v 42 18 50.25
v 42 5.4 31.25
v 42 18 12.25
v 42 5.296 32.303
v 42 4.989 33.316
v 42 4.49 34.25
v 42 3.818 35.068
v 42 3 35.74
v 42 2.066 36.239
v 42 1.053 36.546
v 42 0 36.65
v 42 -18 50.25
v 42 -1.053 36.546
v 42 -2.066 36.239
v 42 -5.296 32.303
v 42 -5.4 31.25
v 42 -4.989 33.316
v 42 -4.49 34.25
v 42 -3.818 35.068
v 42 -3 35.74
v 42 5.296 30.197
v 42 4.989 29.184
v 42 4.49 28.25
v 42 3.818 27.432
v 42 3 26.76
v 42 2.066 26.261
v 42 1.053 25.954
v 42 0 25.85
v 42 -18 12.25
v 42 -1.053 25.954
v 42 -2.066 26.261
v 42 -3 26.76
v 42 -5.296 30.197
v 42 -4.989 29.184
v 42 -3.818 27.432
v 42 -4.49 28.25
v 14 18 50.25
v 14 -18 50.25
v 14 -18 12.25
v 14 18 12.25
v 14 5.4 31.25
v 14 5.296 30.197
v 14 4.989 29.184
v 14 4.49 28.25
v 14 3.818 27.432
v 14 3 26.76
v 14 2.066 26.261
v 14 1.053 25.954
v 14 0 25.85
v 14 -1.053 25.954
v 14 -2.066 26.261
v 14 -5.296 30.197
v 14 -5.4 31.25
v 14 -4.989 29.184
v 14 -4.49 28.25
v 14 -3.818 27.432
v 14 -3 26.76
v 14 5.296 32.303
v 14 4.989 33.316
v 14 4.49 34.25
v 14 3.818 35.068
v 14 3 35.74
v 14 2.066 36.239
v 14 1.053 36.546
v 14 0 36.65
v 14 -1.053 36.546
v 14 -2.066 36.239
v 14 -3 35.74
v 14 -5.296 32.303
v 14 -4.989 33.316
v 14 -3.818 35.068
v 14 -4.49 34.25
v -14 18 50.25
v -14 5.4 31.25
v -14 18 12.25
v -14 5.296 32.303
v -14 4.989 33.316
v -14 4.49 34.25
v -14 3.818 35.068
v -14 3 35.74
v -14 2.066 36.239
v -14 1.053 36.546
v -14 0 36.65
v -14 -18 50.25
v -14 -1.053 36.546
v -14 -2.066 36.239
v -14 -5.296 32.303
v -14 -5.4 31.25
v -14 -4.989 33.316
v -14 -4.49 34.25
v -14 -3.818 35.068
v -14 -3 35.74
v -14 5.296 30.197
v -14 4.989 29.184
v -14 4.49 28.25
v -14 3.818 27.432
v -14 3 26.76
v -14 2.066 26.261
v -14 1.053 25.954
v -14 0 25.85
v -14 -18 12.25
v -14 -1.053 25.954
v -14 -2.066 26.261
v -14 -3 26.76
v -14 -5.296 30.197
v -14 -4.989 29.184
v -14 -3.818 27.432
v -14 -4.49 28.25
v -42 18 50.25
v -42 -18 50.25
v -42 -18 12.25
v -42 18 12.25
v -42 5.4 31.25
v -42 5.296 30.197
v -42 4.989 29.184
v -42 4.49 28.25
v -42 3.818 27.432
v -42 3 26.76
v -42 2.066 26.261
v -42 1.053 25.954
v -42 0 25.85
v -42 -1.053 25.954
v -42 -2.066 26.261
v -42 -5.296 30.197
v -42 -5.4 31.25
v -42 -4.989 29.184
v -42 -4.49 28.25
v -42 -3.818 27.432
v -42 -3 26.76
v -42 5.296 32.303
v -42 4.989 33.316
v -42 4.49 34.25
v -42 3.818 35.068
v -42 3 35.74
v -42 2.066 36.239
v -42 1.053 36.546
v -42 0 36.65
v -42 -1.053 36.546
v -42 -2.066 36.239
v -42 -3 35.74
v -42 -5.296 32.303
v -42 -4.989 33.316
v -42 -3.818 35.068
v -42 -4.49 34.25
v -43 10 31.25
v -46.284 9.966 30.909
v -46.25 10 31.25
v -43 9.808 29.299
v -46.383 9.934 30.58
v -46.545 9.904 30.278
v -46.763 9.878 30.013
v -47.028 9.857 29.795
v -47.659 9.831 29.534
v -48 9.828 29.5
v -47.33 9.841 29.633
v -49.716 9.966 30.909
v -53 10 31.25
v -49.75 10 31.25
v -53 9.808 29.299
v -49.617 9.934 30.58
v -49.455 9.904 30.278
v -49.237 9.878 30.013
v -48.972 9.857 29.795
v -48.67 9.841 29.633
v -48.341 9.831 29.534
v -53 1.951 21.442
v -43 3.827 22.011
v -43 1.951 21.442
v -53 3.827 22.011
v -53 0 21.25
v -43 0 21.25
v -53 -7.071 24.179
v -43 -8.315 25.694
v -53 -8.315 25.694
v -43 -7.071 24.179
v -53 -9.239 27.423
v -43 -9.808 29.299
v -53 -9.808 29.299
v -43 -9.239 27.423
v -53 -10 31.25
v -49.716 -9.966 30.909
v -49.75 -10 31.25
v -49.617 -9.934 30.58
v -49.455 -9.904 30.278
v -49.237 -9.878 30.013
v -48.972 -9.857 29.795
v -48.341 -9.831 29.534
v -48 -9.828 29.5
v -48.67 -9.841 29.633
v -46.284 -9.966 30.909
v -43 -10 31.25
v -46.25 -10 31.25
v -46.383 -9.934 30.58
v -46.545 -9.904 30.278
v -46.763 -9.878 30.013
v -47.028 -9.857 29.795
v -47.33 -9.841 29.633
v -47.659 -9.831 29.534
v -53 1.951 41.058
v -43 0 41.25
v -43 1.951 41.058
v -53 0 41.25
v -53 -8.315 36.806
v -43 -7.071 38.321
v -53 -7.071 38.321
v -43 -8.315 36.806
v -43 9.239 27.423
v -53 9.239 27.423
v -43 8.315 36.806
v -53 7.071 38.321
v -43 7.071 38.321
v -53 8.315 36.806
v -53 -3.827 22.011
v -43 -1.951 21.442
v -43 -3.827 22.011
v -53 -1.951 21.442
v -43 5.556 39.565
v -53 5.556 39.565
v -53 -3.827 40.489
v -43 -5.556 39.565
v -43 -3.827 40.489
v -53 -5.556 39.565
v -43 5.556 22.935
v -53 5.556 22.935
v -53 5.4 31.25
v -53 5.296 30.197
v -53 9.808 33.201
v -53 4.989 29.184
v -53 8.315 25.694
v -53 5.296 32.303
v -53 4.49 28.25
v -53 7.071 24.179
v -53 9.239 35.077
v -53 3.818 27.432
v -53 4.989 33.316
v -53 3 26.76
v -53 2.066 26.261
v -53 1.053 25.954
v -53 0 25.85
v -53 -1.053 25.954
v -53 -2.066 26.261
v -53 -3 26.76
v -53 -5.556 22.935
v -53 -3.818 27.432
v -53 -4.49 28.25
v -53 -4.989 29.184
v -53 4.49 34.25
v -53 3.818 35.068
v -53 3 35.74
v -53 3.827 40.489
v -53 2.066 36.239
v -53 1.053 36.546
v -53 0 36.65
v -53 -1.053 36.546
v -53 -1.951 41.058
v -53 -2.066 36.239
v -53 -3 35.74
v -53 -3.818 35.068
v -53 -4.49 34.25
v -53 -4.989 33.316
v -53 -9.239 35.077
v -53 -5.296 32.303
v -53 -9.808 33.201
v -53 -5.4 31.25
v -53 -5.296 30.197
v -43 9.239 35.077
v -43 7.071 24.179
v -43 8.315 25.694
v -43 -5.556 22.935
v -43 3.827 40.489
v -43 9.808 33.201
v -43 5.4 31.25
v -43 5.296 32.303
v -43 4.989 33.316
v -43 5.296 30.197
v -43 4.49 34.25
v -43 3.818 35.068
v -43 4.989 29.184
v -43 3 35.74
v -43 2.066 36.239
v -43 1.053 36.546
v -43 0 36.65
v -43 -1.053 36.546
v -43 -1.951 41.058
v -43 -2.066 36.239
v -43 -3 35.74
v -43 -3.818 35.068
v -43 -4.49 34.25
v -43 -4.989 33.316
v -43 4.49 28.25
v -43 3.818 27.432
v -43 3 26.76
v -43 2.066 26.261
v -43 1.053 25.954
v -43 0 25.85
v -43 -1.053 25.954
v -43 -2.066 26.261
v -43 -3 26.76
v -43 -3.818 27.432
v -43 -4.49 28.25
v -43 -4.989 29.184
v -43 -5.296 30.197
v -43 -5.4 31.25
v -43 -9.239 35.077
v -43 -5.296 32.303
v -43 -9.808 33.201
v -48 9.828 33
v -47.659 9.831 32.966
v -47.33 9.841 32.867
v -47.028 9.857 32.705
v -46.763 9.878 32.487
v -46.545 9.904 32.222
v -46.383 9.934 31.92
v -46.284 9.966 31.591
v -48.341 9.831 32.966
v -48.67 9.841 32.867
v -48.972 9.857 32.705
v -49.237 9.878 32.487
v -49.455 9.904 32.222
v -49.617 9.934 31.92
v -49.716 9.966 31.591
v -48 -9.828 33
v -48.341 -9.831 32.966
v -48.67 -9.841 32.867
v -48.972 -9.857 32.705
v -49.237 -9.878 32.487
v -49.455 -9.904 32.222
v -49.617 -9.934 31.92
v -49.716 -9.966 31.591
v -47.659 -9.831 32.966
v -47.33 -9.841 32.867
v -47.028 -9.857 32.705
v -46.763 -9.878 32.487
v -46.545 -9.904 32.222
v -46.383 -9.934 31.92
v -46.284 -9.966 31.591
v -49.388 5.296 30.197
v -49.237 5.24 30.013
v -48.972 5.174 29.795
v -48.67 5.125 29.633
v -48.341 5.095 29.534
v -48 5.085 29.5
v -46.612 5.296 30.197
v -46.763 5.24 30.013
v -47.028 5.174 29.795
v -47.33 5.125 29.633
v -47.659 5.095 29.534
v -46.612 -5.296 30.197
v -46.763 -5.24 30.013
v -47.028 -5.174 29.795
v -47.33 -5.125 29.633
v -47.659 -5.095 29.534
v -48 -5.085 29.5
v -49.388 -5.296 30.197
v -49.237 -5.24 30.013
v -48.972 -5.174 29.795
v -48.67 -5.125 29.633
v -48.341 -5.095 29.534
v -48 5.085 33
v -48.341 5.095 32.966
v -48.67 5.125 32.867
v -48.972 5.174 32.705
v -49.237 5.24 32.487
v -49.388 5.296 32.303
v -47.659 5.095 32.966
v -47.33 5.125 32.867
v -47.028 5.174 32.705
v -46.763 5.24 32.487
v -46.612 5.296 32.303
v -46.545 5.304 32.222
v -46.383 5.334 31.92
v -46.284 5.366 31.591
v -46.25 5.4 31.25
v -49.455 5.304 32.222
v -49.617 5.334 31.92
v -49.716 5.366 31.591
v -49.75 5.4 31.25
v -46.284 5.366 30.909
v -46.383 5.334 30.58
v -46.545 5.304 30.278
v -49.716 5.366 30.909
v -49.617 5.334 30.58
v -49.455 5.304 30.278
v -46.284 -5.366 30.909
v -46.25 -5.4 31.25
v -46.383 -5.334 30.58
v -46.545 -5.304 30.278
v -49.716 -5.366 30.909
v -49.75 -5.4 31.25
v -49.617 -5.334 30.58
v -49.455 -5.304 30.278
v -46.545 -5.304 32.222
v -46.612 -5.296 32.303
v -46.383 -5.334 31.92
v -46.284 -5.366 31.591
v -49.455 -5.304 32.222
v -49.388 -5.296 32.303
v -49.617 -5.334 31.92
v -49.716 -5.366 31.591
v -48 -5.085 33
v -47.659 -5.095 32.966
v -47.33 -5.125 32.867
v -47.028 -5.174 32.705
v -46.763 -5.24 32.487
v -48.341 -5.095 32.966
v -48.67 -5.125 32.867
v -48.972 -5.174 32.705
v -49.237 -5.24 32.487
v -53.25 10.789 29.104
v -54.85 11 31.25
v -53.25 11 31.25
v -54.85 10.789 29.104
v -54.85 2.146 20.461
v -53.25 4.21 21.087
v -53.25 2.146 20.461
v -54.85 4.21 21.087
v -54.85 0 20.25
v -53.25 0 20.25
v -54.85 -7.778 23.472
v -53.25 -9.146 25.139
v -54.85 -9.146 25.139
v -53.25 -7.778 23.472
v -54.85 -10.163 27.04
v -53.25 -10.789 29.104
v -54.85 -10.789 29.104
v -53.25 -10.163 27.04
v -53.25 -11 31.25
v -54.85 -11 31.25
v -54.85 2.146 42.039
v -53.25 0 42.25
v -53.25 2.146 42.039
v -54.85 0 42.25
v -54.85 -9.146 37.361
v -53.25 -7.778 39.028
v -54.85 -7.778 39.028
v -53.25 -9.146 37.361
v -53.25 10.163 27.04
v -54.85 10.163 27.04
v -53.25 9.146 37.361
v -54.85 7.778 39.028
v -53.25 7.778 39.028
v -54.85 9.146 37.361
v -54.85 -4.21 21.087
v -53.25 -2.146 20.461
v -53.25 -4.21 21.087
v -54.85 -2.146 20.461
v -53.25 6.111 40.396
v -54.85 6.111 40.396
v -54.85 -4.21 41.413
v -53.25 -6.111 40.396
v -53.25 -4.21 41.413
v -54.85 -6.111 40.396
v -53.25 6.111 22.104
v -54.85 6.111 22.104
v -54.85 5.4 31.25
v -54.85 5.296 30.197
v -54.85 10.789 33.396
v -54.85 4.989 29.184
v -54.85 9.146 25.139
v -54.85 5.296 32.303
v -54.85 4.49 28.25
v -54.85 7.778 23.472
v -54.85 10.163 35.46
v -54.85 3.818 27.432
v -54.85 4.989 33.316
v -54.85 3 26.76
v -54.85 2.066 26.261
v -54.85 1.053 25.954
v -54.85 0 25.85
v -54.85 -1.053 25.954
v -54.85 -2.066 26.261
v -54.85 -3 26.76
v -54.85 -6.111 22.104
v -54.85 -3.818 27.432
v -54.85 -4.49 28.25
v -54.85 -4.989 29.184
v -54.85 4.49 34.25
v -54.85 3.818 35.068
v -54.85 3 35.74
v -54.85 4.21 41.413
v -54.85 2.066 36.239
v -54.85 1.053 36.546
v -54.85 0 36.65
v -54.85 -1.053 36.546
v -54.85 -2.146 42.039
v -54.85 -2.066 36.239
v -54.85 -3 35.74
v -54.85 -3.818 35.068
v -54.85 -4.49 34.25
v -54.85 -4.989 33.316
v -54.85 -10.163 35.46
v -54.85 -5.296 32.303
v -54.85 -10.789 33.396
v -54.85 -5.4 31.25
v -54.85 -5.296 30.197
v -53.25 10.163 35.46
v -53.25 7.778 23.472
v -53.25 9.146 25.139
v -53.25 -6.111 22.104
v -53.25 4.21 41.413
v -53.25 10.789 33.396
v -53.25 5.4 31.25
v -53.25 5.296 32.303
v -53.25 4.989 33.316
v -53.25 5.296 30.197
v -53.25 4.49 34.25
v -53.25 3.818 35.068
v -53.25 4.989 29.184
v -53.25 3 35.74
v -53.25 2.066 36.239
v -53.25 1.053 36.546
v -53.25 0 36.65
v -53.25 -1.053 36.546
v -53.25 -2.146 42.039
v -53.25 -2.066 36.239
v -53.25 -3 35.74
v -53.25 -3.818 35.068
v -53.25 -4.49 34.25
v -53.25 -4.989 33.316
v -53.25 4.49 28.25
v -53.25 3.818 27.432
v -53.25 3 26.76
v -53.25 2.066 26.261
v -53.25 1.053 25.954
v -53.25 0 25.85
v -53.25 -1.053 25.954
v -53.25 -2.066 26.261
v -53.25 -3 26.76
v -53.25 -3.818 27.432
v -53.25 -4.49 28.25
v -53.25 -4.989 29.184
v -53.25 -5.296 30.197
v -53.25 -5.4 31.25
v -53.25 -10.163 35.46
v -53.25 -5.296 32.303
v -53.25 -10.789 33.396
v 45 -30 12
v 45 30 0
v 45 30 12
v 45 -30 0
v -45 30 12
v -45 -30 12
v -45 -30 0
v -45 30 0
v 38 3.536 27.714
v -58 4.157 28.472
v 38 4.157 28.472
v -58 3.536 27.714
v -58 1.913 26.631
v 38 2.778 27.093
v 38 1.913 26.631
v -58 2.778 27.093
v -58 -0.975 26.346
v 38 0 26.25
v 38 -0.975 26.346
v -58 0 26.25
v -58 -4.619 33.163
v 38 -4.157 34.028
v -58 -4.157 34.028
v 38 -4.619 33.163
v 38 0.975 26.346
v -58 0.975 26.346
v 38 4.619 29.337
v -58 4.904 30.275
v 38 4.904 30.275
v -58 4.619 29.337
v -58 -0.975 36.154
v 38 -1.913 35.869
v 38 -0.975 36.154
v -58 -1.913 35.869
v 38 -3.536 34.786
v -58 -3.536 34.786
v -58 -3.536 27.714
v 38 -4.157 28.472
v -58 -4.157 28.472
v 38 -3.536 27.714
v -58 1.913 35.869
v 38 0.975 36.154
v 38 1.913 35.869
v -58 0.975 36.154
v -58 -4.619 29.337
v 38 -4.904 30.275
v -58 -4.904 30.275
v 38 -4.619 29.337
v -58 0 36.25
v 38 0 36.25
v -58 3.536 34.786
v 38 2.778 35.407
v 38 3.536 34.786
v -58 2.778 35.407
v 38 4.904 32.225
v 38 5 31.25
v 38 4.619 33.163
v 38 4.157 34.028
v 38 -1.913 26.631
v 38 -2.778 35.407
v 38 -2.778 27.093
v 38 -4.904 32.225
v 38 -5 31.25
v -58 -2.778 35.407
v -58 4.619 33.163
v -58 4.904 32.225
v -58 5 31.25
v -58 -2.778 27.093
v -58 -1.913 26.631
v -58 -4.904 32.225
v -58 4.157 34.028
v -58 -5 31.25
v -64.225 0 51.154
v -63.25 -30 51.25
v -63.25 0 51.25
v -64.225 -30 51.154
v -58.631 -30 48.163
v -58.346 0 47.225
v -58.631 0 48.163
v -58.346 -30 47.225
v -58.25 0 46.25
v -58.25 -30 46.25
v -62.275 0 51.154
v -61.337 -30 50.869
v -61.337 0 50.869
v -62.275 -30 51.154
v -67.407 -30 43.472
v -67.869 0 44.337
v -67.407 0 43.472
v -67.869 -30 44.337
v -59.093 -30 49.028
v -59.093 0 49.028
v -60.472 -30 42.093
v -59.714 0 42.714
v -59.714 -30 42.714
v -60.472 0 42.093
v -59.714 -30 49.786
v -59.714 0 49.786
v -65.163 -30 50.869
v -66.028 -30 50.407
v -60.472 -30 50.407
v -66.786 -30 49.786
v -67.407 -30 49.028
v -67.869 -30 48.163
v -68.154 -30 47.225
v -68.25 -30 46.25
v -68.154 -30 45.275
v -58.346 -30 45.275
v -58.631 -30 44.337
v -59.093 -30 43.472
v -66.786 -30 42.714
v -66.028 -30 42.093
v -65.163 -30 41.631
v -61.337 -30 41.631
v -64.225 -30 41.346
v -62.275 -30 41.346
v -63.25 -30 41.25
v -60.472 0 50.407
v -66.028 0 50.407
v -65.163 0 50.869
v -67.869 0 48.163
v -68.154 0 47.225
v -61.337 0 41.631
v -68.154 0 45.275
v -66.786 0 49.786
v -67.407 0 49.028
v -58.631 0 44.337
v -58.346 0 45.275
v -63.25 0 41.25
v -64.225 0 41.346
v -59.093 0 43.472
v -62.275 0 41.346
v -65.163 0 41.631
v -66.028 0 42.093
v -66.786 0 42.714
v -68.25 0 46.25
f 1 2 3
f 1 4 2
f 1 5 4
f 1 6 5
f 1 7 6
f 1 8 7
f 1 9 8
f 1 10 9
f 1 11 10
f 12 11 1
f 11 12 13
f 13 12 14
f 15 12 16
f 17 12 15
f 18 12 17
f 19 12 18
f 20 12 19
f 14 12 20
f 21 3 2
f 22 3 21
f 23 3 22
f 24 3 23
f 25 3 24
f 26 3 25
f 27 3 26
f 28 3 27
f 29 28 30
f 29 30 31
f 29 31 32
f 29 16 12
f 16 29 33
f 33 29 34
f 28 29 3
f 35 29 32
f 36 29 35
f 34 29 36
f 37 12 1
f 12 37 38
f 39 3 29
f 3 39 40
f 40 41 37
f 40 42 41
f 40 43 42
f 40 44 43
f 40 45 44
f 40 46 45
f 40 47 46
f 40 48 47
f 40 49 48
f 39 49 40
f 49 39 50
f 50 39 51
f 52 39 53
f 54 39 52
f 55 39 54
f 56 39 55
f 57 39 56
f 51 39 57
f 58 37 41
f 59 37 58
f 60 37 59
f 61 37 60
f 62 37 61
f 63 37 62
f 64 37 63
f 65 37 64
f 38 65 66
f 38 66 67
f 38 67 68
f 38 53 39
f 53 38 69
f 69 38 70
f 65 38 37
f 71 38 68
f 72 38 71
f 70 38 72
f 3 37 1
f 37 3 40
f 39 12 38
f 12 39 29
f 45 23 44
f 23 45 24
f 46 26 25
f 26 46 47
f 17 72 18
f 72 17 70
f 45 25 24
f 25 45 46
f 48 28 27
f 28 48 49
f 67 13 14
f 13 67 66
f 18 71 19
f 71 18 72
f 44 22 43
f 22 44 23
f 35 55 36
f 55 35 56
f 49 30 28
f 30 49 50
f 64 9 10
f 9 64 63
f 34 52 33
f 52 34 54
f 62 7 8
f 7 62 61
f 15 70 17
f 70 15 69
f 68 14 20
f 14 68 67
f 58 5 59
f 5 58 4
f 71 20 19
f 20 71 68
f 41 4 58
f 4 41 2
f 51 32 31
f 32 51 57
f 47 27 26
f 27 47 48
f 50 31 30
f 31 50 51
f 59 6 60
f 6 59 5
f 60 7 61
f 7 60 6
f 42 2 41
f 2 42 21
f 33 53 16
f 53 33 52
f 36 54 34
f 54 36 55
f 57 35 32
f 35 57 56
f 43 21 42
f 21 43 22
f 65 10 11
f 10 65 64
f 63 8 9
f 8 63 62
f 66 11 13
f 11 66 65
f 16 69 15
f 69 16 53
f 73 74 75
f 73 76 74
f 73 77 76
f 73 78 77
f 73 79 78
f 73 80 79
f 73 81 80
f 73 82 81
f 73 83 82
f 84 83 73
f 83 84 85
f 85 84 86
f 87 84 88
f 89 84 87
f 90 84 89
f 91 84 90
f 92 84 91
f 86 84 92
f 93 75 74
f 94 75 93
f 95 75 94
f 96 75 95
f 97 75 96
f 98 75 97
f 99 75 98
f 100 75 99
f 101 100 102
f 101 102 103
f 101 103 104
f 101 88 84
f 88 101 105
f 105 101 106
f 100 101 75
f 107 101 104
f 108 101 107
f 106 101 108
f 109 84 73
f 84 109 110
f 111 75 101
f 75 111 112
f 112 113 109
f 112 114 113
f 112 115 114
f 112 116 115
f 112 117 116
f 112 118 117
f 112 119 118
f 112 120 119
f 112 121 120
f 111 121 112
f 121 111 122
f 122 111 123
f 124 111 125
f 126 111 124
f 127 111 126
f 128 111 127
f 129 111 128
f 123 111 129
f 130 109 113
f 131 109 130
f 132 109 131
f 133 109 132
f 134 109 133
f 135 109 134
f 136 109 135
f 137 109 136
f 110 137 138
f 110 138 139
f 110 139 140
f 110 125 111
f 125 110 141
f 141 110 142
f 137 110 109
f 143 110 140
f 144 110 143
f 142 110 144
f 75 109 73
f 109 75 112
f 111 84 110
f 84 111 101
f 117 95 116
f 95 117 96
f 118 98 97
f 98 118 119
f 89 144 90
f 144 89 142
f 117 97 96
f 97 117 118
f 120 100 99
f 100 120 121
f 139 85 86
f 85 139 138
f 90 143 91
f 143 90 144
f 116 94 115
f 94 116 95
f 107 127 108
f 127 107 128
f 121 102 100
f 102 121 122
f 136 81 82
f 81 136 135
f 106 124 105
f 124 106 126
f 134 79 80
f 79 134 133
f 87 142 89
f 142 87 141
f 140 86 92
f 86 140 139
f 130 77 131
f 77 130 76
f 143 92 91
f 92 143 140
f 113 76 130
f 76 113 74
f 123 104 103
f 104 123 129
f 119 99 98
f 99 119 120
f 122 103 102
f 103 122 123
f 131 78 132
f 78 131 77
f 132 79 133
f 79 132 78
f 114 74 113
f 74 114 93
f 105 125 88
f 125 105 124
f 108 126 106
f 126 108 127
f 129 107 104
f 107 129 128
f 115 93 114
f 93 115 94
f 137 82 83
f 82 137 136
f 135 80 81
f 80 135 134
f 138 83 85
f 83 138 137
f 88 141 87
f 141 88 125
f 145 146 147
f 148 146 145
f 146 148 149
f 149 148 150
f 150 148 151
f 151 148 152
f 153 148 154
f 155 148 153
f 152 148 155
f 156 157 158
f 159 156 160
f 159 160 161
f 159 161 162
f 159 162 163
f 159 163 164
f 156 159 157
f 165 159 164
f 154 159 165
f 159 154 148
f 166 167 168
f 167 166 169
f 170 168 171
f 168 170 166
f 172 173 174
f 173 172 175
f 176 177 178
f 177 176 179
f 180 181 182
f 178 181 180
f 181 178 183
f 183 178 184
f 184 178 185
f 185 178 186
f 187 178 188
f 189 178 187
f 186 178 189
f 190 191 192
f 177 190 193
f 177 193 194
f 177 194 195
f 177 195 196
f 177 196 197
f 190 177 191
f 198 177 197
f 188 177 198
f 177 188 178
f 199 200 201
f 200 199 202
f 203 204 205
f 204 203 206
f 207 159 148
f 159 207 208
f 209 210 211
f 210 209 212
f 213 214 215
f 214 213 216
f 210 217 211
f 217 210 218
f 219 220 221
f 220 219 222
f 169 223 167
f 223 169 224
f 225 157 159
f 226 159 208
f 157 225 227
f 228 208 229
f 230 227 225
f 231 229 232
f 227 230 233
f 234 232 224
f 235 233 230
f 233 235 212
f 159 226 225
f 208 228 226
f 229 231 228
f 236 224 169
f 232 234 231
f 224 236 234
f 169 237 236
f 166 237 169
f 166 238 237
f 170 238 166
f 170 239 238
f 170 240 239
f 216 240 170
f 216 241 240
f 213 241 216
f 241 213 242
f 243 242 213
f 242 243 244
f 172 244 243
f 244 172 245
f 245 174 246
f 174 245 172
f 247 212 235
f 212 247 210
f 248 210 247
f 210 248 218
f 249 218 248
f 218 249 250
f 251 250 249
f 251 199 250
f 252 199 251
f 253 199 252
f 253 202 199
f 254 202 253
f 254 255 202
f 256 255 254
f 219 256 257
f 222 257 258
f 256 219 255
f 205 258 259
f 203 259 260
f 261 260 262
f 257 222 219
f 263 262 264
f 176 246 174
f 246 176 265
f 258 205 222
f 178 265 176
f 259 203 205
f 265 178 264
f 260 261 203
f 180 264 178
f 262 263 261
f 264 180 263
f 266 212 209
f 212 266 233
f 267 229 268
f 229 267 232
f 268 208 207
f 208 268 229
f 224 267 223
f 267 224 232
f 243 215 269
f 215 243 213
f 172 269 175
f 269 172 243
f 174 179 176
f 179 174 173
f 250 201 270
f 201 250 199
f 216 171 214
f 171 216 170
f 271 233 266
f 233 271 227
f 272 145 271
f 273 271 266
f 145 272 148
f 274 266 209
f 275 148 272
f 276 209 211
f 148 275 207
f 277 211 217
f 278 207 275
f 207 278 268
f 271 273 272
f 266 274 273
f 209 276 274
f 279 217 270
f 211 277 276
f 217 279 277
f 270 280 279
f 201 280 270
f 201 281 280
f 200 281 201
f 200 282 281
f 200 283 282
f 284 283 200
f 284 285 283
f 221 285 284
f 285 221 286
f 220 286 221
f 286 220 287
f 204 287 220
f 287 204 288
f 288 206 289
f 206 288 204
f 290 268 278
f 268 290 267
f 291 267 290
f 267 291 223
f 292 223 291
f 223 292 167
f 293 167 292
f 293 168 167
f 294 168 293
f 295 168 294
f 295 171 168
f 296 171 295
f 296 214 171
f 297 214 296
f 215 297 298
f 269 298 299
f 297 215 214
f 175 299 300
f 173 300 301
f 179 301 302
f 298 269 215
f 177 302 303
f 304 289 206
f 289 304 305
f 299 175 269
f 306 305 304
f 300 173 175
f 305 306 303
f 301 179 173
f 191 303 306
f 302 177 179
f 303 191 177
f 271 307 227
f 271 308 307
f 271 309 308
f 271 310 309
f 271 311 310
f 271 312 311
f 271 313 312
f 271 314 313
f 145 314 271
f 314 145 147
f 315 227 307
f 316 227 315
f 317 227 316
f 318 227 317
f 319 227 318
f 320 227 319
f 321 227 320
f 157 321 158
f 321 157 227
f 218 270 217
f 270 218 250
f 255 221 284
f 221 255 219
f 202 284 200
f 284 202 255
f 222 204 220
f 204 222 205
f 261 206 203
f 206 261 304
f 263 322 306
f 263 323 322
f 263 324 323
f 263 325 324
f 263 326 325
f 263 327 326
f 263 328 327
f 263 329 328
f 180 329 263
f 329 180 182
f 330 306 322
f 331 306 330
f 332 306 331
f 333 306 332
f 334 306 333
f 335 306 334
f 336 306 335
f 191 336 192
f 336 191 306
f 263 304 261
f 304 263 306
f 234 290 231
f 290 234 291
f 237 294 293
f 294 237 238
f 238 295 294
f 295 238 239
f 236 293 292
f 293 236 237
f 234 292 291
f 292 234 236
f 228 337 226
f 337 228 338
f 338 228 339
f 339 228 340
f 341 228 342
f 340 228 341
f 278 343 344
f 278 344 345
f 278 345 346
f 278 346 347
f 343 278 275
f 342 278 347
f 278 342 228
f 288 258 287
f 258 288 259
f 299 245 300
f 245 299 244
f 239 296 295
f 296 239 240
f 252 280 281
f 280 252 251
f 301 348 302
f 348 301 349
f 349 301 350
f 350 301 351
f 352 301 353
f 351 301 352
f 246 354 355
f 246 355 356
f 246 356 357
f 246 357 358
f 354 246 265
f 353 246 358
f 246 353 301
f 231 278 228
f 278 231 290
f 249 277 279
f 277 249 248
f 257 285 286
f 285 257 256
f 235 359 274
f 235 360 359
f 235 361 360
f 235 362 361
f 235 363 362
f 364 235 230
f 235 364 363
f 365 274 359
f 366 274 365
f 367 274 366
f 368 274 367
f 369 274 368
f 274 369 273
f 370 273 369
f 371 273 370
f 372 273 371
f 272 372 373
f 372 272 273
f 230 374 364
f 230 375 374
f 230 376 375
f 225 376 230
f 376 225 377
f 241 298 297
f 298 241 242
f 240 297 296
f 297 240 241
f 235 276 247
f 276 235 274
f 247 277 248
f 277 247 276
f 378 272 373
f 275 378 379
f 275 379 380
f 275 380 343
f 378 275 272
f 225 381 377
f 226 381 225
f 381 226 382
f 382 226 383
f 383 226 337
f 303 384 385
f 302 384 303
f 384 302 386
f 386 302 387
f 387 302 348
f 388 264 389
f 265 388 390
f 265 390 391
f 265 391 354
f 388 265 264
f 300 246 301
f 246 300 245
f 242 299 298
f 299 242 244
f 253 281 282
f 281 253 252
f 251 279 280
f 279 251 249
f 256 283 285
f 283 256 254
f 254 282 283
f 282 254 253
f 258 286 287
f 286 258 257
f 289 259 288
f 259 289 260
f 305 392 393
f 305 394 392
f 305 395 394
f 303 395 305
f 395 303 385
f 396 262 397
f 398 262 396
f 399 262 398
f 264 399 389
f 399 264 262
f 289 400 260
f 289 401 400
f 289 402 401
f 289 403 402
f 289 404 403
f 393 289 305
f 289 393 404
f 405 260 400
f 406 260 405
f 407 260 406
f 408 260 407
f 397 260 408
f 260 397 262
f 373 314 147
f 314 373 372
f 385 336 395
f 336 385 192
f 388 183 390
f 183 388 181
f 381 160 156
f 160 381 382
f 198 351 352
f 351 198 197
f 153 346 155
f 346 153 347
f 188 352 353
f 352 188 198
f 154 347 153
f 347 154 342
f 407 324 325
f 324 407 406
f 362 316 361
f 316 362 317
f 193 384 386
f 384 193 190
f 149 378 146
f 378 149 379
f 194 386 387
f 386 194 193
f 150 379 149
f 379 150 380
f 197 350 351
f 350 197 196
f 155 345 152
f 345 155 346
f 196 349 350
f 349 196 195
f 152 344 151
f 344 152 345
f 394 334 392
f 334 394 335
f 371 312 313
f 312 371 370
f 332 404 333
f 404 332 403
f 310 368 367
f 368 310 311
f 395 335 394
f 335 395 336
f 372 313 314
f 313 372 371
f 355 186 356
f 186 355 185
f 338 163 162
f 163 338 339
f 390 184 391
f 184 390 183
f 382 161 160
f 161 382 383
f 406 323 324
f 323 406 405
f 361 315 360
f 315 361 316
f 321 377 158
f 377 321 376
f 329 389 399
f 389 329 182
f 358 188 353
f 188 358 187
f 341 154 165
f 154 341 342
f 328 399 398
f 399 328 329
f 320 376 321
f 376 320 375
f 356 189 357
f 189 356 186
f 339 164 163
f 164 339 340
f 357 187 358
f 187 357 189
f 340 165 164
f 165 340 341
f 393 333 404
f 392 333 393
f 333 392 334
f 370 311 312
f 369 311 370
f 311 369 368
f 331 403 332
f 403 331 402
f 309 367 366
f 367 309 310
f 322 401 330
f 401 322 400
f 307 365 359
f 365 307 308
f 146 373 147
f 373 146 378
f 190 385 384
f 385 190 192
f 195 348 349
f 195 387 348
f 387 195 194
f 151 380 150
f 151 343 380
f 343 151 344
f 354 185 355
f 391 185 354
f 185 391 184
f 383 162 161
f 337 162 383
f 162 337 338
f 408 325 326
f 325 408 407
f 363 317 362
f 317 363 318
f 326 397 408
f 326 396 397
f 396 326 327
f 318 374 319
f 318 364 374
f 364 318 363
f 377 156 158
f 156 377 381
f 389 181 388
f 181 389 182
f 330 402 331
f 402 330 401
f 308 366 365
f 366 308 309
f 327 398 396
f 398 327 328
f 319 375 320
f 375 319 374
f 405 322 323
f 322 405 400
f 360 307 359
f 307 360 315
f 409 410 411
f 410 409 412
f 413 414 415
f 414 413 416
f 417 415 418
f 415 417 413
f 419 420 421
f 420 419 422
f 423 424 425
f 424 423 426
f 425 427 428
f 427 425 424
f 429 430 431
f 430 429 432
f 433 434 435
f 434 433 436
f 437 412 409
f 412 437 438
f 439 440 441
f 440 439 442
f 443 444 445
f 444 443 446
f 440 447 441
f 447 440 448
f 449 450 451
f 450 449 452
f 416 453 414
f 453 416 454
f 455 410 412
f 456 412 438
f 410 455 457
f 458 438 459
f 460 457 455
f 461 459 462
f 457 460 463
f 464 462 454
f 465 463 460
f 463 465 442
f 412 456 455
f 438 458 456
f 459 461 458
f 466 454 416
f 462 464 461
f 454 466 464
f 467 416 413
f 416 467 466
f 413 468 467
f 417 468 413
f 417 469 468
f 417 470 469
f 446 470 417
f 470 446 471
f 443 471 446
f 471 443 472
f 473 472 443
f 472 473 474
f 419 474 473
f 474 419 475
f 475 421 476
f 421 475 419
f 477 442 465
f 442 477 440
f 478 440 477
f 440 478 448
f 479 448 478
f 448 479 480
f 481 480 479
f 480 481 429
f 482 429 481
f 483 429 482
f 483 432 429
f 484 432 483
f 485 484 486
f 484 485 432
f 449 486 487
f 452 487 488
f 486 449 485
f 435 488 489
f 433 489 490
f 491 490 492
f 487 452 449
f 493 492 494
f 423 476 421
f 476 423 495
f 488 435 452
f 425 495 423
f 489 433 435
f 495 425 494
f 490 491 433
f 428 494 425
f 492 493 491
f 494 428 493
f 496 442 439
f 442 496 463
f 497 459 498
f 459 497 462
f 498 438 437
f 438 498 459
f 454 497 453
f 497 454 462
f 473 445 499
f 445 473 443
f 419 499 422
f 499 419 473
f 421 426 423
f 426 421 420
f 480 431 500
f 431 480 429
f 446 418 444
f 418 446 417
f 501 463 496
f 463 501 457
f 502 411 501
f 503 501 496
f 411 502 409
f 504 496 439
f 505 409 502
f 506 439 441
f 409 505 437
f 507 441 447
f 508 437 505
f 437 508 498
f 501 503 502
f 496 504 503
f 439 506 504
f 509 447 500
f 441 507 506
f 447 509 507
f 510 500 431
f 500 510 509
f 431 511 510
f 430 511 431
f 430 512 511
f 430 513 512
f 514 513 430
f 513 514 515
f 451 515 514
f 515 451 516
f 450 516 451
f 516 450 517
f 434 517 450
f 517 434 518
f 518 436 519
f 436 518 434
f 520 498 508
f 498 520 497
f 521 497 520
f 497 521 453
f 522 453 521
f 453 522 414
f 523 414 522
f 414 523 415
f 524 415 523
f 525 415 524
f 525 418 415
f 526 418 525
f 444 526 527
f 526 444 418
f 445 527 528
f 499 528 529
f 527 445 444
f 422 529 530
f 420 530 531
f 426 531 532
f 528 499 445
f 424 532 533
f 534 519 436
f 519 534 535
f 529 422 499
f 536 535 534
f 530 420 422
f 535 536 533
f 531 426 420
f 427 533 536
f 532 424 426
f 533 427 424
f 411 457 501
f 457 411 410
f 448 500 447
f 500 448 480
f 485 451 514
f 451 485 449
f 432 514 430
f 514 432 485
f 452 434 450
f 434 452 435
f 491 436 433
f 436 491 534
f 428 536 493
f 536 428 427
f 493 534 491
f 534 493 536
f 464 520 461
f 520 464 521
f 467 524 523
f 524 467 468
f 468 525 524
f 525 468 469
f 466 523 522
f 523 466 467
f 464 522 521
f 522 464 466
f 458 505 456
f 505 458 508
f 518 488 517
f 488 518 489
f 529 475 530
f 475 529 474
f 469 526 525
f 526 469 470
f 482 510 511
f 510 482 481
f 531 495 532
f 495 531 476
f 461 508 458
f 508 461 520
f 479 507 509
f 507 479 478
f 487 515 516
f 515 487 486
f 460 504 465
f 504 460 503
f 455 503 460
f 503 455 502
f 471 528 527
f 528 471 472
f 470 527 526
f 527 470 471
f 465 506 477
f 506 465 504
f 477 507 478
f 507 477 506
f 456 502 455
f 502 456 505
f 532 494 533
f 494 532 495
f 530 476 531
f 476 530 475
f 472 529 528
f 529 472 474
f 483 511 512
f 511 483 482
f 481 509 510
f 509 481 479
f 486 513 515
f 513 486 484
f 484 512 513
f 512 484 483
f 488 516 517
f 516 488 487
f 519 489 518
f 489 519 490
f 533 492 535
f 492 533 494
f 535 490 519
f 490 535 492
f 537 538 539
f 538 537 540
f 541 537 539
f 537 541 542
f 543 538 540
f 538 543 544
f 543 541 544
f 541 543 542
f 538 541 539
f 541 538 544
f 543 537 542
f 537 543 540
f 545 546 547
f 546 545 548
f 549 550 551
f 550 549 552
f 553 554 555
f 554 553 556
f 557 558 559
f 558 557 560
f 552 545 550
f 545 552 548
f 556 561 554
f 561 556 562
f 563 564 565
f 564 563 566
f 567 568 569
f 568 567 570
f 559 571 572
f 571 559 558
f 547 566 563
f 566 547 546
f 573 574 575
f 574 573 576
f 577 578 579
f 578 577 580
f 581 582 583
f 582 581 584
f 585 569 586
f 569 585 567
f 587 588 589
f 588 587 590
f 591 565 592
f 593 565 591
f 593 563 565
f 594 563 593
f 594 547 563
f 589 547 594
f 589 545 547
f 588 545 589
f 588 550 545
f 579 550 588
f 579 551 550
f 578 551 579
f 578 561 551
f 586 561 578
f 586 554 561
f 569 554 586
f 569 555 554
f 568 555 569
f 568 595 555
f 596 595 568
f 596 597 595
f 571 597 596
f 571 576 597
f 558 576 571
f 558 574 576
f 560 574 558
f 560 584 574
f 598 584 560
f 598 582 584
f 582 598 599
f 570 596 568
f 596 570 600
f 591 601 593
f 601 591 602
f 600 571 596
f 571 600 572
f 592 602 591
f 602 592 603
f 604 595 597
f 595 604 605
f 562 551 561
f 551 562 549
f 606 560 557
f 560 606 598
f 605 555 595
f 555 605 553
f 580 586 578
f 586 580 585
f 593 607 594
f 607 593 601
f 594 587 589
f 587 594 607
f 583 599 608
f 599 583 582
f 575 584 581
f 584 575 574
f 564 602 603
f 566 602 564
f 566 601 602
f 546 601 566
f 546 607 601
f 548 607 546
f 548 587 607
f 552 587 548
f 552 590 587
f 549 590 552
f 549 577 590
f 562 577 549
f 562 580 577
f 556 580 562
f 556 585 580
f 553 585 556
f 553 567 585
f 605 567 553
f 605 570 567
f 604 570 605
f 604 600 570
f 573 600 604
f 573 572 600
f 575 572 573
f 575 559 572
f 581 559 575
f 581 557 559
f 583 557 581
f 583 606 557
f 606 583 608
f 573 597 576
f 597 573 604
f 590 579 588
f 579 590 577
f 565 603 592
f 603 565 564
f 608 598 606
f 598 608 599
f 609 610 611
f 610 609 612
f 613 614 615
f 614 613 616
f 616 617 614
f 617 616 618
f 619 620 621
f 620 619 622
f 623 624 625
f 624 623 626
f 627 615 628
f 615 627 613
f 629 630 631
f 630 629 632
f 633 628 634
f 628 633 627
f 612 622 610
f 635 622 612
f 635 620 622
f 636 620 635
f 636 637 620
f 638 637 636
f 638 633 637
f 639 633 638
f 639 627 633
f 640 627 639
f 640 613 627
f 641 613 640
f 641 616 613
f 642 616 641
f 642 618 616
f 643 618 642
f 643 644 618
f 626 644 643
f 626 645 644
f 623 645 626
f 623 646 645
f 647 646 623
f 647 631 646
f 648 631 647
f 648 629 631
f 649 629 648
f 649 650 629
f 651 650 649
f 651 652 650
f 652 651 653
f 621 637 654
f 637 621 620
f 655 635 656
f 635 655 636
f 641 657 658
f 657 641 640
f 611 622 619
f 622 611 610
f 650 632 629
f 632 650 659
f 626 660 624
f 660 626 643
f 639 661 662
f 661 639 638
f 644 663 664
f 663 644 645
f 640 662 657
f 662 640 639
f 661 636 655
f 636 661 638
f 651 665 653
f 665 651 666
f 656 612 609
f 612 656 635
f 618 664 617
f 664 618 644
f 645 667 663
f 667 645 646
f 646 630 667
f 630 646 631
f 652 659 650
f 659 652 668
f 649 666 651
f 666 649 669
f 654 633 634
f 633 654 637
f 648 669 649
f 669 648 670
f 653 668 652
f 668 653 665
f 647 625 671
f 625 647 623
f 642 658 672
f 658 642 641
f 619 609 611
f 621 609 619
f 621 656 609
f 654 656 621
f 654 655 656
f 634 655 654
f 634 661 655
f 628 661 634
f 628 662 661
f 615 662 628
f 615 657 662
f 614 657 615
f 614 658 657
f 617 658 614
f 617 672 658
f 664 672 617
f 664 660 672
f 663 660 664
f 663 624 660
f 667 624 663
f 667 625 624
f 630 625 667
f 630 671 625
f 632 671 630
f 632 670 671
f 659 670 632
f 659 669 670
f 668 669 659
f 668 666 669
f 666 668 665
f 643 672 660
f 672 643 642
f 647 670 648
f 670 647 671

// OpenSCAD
$fn = 32;

// ------------------------------------------------------------------------
// Machine vise: screw d10, jaws 28 x 38 mm
// Every part is its own module, assembly() places every instance.
// ------------------------------------------------------------------------

// --- part 1 ---
module vise_bed() {
  difference() {
    translate([-45, -30, 0]) cube([90, 60, 12]);
  }
}

// --- part 2 ---
module vise_jaw() {
  difference() {
    translate([-14, -18, 0]) cube([28, 36, 38]);
    translate([0, 0, 19]) rotate([0, 90, 0]) cylinder(h = 30, d = 10.8, center = true);
  }
}

// --- part 3 ---
module vise_screw() {
  translate([0, 0, -48]) cylinder(h = 96, d = 10);
}

// --- part 4 ---
module screw_collar() {
  difference() {
    cylinder(h = 10, d = 20);
    translate([0, 0, -1]) cylinder(h = 12, d = 10.8);
    translate([0, 0, 5]) rotate([90, 0, 0]) cylinder(h = 22, d = 3.5, center = true);
  }
}

// --- part 5 ---
module screw_washer() {
  difference() {
      translate([0, 0, 0]) cylinder(h = 1.6, d = 22);
      translate([0, 0, -1]) cylinder(h = 3.6, d = 10.8);
    }
}

// --- part 6 ---
module vise_handle() {
  cylinder(h = 30, d = 10);
}

// --- assembly ---
module assembly() {
  color([0.80, 0.24, 0.20]) translate([0, 0, 0]) rotate([0, 0, 0]) vise_bed();
  color([0.20, 0.45, 0.75]) translate([28, 0, 12.25]) rotate([0, 0, 0]) vise_jaw();
  color([0.25, 0.62, 0.32]) translate([-28, 0, 12.25]) rotate([0, 0, 0]) vise_jaw();
  color([0.92, 0.70, 0.18]) translate([-10, 0, 31.25]) rotate([0, 90, 0]) vise_screw();
  color([0.58, 0.35, 0.70]) translate([-53, 0, 31.25]) rotate([0, 90, 0]) screw_collar();
  color([0.16, 0.66, 0.66]) translate([-54.85, 0, 31.25]) rotate([0, 90, 0]) screw_washer();
  color([0.85, 0.48, 0.18]) translate([-63.25, 0, 46.25]) rotate([90, 0, 0]) vise_handle();
}

assembly();
